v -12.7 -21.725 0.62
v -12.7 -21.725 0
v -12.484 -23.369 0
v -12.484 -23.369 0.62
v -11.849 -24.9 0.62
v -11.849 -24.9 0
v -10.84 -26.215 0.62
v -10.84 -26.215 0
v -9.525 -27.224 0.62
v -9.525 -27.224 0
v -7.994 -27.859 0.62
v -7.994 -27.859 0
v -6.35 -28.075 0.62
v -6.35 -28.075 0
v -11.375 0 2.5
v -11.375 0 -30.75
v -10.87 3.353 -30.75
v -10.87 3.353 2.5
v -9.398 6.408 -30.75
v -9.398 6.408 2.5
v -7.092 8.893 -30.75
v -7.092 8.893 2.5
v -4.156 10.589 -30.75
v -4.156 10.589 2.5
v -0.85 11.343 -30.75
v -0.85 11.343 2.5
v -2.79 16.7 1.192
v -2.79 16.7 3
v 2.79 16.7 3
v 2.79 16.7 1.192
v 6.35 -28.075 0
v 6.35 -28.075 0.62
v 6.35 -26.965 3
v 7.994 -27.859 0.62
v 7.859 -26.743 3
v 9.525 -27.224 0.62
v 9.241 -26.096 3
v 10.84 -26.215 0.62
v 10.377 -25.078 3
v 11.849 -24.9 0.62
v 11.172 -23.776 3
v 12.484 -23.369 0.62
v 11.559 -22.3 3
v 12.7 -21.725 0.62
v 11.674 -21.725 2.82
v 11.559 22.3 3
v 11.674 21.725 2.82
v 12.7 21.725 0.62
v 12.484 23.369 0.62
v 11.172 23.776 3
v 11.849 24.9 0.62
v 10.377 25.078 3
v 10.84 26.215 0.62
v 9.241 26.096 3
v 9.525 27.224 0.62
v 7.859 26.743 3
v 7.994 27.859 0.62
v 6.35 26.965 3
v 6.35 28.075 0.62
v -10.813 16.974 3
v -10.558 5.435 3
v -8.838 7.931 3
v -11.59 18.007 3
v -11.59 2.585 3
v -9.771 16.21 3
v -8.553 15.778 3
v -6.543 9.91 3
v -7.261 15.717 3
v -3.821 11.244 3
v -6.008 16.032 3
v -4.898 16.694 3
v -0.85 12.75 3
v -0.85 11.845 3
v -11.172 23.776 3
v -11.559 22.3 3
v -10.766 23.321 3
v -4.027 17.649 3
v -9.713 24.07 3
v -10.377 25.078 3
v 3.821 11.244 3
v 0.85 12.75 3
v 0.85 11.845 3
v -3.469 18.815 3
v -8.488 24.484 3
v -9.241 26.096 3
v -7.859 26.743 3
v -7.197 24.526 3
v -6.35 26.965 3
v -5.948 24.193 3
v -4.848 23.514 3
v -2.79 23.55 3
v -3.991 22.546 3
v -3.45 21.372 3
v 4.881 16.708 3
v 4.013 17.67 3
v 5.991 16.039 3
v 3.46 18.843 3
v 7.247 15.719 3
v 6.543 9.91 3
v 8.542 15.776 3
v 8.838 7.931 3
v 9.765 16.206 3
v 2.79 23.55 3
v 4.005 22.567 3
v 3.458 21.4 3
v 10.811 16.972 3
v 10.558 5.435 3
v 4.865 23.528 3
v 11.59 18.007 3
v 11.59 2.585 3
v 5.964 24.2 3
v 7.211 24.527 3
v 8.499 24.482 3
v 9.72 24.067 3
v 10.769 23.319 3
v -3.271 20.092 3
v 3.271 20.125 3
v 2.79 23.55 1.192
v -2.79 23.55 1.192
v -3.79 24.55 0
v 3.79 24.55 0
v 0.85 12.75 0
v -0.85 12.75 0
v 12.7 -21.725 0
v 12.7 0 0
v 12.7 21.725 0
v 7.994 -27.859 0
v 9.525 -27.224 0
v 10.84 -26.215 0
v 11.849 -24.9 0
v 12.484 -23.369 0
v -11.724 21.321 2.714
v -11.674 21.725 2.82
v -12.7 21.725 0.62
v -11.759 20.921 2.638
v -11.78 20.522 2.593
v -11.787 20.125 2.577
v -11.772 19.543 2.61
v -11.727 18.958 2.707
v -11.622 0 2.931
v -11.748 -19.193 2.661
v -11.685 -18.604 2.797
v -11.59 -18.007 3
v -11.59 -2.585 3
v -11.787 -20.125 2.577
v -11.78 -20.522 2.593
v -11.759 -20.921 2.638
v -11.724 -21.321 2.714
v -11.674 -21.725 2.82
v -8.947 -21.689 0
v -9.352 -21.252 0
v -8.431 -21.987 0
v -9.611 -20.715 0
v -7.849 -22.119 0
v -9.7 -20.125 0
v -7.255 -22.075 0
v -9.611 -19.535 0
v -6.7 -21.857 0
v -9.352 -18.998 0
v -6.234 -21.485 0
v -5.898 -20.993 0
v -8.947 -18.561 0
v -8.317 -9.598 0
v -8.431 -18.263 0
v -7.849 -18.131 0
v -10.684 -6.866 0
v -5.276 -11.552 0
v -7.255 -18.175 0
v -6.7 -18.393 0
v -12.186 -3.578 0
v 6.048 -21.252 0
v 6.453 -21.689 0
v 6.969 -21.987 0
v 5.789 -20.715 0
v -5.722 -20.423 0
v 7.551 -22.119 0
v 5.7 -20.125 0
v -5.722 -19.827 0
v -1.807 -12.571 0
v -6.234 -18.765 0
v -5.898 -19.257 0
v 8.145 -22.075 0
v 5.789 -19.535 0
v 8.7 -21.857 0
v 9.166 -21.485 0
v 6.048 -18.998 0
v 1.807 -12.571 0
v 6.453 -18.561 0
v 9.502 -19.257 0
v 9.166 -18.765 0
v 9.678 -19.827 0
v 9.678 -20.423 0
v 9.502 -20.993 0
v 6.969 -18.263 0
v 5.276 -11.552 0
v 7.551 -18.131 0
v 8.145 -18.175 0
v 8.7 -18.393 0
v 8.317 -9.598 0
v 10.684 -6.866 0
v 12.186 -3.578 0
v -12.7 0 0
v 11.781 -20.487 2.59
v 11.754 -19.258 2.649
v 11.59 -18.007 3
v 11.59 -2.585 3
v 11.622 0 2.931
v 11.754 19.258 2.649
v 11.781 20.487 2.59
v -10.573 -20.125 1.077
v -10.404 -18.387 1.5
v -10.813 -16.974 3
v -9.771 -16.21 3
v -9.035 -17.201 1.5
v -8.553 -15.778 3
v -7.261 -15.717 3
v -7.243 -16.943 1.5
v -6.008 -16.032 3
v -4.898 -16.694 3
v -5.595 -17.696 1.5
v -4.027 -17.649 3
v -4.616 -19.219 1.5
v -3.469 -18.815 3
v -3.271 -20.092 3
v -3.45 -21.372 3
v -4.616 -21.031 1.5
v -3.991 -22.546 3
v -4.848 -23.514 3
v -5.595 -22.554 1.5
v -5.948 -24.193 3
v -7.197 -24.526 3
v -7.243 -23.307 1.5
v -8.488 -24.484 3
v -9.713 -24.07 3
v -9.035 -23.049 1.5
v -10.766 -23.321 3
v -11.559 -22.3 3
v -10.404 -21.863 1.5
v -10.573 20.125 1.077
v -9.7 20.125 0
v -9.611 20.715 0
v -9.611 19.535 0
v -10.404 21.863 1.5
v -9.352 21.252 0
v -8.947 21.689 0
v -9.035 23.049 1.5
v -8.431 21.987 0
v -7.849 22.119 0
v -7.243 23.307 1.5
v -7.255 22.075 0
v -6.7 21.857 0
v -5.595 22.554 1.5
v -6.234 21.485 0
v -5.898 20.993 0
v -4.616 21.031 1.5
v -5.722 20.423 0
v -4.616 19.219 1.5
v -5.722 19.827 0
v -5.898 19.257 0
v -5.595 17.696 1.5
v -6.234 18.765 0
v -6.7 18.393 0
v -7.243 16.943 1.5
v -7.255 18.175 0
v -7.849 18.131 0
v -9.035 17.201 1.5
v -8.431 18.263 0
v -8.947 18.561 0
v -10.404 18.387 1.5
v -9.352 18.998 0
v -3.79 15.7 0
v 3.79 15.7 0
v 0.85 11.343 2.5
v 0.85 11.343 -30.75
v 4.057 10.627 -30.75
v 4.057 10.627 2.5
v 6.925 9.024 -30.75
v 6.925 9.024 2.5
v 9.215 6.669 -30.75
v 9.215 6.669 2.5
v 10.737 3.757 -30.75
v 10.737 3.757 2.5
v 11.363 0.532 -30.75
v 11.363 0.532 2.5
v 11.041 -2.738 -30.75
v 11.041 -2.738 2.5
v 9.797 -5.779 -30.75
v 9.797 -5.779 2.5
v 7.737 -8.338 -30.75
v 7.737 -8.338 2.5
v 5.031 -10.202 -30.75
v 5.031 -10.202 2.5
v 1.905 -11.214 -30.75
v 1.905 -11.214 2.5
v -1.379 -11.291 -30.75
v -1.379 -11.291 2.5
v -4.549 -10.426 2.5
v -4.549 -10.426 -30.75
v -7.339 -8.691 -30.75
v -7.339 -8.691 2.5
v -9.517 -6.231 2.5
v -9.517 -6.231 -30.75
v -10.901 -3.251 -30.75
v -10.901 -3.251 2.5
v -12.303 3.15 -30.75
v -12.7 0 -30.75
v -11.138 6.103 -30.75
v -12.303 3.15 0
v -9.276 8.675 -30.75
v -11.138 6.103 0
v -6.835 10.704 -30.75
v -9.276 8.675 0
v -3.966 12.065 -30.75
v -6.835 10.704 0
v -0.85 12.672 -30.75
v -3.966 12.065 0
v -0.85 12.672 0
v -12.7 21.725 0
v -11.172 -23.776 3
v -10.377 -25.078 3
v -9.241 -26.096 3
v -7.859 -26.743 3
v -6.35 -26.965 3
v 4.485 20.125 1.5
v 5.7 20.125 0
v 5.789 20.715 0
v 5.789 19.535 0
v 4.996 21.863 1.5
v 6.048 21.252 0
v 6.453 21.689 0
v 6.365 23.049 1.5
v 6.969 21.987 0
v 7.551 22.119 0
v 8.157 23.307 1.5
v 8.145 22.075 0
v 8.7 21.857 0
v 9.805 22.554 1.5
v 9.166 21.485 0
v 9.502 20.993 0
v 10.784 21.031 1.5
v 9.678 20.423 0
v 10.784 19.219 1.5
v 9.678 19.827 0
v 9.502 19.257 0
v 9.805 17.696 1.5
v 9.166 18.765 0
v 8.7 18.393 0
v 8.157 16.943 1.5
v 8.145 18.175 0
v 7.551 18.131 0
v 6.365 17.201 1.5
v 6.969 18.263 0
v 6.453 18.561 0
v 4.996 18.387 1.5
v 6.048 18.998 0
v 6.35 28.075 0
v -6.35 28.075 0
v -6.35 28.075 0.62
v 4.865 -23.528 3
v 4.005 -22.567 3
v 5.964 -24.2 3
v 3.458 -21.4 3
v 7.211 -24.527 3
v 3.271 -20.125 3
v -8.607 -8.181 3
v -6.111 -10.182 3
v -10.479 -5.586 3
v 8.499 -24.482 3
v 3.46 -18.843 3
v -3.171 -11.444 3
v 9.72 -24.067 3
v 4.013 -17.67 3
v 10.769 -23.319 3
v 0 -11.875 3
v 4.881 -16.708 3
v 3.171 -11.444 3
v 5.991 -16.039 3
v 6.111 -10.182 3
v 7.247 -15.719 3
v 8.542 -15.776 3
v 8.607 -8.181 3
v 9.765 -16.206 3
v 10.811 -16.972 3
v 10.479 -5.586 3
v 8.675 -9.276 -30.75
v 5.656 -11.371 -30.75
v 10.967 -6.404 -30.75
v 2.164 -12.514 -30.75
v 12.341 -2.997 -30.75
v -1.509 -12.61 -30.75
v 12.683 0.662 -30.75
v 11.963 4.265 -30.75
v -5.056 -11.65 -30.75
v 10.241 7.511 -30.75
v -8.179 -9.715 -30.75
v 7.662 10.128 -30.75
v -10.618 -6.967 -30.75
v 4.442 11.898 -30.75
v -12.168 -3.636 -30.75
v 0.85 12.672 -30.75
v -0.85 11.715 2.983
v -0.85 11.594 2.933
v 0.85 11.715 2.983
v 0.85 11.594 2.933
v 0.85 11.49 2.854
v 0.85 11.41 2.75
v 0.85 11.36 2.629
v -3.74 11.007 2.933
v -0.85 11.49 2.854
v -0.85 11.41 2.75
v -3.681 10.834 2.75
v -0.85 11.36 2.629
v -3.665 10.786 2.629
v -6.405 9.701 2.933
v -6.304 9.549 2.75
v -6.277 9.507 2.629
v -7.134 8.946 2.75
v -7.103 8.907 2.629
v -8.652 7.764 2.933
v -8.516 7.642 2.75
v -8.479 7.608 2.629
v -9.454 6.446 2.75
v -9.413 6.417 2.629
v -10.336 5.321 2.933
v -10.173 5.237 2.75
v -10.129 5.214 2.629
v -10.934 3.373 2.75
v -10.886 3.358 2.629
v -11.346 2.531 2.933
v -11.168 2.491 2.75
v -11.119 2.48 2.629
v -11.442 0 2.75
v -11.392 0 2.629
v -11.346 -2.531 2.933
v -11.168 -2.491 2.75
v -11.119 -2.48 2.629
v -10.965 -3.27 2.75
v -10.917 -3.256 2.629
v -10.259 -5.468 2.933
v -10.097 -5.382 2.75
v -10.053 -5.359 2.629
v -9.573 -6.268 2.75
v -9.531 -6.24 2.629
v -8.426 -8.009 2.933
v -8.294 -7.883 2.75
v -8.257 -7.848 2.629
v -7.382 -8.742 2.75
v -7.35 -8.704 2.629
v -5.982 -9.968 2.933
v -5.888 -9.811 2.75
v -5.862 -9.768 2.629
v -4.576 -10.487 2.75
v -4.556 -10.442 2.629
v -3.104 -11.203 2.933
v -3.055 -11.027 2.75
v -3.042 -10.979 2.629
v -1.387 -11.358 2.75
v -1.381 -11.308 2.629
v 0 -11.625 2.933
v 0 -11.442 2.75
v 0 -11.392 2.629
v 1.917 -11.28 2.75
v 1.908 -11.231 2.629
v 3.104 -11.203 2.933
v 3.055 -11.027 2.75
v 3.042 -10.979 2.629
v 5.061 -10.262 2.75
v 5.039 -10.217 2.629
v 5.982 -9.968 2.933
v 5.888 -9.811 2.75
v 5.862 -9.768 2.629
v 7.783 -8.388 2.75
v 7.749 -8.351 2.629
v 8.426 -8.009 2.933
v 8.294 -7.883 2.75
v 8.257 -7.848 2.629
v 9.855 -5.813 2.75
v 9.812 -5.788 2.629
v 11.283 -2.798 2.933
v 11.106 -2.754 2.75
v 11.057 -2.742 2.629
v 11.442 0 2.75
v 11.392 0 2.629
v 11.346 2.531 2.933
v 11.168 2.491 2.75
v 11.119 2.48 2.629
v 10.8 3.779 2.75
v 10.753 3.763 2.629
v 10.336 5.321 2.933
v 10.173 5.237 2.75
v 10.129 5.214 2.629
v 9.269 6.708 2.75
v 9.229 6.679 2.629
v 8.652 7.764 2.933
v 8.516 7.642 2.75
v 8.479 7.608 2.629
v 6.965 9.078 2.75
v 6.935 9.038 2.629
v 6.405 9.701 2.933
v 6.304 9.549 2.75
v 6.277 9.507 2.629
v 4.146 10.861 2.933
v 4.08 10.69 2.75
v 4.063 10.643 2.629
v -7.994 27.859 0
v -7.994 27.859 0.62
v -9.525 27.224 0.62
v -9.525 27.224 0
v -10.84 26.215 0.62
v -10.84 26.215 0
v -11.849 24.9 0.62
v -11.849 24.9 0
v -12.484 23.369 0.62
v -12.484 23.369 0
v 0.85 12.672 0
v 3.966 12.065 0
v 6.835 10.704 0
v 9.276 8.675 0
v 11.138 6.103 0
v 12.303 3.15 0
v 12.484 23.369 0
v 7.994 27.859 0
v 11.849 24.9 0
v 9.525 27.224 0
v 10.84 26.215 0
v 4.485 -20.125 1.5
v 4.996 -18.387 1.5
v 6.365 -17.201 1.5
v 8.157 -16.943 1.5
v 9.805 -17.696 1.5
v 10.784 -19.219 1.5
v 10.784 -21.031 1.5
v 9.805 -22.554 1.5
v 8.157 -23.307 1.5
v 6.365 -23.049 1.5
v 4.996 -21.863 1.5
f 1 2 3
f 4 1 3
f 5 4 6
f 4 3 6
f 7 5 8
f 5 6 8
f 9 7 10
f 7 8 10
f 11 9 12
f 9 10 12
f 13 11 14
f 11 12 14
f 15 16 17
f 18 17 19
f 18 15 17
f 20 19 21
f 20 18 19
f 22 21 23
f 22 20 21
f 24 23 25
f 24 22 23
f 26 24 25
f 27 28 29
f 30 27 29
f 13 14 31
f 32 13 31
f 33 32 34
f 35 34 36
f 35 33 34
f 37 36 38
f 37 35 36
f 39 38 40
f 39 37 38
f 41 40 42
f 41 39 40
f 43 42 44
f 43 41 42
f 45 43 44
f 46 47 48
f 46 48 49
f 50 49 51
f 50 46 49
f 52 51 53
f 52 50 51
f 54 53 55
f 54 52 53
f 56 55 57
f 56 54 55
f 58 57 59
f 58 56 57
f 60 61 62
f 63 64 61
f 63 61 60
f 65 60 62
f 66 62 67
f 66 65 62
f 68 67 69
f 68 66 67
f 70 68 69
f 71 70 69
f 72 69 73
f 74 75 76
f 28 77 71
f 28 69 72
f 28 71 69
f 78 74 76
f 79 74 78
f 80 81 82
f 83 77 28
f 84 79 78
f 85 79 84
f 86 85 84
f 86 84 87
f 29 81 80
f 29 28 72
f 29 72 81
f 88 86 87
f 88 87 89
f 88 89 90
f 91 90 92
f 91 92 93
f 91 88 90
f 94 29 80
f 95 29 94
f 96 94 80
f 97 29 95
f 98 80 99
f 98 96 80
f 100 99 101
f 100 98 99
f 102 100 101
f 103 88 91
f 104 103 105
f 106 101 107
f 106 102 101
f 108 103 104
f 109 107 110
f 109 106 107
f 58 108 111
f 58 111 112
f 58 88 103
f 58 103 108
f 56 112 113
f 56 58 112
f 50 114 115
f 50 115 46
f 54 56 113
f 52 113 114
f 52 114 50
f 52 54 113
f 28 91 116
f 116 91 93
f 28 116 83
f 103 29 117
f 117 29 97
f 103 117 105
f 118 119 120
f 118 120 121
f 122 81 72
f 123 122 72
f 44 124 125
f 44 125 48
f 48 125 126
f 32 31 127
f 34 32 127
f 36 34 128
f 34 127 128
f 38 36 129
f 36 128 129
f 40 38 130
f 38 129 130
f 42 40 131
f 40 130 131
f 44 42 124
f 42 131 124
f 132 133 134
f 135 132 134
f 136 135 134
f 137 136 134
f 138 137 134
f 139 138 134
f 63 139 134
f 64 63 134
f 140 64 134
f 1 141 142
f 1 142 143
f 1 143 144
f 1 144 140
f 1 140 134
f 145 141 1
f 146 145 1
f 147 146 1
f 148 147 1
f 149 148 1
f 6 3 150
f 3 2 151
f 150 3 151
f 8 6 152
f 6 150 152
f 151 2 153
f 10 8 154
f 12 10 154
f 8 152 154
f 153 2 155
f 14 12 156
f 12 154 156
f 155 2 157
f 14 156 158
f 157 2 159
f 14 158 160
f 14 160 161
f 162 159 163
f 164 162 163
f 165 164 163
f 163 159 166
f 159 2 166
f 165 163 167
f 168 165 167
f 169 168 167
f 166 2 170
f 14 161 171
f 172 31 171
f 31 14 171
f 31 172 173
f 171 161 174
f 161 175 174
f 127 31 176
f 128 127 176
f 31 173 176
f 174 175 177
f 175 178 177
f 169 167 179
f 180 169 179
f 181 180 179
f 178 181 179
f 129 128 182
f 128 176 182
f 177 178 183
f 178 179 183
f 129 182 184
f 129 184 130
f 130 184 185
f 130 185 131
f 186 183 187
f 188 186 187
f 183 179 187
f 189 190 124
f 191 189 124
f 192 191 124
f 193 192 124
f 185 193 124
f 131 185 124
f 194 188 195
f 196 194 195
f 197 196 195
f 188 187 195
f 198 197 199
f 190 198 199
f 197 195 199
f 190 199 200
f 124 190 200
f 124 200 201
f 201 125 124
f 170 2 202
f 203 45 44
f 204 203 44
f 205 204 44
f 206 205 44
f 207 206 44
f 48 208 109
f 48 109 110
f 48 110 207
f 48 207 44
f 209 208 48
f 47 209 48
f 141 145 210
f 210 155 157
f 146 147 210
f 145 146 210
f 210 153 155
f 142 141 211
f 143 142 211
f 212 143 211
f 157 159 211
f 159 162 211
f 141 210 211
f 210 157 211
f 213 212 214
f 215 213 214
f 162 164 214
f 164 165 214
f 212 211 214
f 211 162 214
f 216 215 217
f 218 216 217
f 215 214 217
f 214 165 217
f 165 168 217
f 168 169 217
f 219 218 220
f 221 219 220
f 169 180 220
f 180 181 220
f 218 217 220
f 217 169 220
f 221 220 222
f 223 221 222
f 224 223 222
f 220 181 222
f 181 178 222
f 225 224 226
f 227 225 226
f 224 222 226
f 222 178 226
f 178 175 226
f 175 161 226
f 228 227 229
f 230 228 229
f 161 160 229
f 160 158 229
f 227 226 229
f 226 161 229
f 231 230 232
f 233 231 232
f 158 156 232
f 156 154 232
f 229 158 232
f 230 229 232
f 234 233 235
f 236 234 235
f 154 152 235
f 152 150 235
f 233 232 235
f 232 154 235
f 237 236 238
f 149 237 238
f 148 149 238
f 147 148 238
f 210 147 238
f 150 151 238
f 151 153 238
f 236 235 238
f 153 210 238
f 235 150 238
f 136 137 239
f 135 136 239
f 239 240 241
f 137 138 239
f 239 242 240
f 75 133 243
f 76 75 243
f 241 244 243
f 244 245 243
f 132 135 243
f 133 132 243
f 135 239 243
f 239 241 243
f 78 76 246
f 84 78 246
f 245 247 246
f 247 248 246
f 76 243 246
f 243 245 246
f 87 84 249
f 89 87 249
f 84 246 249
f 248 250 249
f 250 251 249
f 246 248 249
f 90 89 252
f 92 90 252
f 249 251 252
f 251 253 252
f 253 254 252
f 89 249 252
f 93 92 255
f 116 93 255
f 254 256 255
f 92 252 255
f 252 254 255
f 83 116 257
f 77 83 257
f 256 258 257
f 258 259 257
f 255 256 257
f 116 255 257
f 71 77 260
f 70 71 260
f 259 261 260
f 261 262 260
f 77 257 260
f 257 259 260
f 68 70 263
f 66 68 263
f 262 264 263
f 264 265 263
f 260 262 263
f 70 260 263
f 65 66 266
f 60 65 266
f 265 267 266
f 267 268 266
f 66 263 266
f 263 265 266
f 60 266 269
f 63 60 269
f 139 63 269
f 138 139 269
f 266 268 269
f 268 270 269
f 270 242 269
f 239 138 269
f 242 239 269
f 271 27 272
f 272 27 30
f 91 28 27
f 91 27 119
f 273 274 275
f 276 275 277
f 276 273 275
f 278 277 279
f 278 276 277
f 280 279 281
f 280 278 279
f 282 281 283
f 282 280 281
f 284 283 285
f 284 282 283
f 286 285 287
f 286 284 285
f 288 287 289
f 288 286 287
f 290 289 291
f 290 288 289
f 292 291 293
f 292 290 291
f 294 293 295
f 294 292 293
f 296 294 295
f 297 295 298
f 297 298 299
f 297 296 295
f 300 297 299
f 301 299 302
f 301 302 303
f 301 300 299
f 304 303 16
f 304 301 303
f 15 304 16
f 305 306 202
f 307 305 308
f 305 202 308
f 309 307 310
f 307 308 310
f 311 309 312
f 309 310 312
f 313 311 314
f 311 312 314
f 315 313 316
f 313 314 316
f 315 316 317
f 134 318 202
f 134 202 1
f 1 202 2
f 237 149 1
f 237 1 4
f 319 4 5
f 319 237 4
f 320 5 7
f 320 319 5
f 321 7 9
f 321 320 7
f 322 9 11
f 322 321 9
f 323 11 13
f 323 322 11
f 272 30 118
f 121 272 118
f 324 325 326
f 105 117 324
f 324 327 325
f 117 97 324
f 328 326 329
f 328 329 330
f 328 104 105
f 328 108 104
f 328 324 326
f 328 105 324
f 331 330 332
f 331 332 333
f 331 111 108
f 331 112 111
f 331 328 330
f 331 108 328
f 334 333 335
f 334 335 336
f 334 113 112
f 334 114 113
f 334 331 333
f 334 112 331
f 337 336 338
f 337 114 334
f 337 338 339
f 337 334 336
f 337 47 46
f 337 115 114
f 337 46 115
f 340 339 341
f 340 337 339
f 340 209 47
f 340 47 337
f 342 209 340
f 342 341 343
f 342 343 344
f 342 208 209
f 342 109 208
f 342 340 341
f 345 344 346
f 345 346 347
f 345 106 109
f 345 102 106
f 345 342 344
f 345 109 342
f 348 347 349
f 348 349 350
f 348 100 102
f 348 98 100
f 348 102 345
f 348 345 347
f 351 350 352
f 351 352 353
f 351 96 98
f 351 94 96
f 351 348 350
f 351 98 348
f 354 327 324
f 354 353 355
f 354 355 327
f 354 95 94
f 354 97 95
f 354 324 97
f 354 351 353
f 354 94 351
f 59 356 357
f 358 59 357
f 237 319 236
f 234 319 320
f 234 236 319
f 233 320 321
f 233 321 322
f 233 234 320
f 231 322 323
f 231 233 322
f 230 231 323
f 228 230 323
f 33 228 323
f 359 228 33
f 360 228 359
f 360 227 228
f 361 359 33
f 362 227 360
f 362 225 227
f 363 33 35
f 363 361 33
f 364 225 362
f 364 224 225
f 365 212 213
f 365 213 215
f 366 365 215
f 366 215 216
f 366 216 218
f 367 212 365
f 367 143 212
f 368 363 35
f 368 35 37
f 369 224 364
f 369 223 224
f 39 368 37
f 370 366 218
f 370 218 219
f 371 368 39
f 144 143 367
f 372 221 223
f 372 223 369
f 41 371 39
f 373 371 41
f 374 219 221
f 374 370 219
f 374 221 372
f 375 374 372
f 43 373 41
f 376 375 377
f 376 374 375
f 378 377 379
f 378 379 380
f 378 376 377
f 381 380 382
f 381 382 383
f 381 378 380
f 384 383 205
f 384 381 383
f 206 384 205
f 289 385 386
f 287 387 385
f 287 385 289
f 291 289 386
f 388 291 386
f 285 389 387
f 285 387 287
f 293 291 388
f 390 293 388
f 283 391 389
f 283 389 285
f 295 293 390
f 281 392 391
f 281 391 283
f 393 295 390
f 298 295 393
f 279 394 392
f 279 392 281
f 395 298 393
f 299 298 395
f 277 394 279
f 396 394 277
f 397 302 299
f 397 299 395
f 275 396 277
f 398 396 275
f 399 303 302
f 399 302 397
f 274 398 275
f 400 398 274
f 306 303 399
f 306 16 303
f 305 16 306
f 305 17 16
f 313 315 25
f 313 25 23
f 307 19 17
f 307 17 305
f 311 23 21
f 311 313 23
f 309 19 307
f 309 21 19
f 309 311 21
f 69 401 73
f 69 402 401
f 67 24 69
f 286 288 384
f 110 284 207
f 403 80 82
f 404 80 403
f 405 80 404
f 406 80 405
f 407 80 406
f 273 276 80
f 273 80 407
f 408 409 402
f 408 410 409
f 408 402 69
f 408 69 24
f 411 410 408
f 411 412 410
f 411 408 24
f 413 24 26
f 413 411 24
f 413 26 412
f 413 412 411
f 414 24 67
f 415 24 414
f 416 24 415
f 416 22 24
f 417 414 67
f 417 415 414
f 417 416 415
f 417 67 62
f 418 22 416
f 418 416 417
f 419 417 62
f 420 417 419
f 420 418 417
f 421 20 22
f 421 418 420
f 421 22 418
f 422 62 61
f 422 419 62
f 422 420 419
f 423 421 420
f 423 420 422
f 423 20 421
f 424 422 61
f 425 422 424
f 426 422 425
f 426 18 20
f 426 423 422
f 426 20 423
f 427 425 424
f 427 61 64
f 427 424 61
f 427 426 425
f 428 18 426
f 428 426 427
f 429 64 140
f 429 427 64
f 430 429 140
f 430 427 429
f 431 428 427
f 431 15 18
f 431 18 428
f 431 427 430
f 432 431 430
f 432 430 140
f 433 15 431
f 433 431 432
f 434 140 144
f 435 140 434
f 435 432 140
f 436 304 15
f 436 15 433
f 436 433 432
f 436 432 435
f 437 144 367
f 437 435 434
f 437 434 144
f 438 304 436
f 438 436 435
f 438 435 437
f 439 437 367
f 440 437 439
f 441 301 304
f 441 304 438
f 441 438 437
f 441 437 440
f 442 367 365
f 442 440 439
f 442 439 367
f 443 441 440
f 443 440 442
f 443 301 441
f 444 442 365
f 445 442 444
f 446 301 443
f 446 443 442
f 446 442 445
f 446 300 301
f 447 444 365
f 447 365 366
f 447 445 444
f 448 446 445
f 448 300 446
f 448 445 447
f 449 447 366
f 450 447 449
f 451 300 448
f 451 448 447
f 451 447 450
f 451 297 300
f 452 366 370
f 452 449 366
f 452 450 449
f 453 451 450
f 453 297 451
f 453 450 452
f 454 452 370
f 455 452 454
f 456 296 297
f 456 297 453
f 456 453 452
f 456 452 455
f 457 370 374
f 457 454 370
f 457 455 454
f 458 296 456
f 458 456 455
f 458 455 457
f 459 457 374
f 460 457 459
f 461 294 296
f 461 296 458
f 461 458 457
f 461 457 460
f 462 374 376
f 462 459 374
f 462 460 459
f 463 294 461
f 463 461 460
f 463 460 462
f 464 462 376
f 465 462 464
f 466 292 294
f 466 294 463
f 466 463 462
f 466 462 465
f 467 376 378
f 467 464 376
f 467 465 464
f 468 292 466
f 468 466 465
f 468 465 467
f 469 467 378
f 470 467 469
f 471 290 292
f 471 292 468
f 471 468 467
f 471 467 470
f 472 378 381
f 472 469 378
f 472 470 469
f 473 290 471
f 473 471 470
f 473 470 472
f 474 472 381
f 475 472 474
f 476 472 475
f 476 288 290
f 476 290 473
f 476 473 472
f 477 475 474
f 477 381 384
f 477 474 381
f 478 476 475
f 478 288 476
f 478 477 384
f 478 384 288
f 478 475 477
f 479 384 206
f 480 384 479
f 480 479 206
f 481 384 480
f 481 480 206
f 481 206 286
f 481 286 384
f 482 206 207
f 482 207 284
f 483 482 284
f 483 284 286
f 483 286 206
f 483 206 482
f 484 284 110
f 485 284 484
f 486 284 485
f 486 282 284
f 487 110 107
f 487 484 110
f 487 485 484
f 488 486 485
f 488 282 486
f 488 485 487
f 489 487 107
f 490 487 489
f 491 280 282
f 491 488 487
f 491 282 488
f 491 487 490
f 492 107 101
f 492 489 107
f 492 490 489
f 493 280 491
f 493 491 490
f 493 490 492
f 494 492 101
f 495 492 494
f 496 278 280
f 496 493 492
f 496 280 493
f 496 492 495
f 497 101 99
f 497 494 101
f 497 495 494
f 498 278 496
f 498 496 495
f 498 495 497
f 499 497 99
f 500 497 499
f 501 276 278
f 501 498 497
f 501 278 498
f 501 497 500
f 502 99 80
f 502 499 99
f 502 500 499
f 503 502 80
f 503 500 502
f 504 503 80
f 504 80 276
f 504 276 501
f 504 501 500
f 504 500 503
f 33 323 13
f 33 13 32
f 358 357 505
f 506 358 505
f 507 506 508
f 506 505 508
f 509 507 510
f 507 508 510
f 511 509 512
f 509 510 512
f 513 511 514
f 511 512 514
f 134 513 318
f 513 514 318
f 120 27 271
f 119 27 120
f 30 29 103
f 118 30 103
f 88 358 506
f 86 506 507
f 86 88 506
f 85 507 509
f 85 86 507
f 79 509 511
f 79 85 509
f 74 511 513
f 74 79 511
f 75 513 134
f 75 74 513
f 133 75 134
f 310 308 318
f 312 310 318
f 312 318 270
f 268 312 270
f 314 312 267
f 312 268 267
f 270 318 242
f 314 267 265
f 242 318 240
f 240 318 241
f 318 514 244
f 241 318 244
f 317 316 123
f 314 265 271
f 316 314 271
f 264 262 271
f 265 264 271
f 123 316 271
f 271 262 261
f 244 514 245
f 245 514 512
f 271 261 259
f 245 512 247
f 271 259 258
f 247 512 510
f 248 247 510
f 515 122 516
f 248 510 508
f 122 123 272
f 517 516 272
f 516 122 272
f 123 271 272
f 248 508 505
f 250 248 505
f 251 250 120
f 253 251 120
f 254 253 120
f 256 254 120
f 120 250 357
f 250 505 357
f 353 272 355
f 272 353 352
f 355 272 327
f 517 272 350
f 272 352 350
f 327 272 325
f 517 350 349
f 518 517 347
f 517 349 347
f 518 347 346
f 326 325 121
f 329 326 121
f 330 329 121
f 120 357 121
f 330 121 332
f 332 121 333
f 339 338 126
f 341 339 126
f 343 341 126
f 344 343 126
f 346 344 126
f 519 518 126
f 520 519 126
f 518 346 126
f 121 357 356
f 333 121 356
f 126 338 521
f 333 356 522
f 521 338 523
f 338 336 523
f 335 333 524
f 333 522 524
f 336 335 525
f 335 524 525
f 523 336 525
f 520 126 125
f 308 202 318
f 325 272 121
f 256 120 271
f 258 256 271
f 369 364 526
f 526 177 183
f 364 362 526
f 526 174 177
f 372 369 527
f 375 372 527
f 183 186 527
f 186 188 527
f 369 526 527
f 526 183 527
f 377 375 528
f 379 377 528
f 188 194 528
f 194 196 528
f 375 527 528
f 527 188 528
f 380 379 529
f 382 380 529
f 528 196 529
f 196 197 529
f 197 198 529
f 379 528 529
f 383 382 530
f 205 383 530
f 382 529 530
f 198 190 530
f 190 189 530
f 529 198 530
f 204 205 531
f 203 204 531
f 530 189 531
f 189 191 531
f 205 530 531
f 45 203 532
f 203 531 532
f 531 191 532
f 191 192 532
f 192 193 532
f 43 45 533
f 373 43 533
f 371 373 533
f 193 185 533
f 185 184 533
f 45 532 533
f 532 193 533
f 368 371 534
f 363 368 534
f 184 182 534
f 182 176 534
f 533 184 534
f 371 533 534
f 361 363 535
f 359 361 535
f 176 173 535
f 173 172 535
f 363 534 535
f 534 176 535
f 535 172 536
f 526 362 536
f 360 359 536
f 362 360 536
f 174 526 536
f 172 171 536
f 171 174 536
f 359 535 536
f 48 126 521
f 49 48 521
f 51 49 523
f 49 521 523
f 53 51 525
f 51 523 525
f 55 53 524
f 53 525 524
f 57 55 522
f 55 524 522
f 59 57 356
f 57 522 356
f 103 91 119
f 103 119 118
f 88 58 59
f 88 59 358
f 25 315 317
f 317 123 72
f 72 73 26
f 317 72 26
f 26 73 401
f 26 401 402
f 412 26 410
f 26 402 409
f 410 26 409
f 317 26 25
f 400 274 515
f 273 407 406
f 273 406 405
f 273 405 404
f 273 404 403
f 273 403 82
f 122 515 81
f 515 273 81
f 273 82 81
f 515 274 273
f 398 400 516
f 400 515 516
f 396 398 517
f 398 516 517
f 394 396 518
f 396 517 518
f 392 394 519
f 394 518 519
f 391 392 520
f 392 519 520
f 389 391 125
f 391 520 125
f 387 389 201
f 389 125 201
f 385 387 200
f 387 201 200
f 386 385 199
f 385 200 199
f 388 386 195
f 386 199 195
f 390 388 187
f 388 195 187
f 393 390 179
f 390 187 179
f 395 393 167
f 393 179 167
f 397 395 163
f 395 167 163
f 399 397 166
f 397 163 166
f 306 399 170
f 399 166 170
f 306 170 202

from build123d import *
from OCP.BRepFilletAPI import BRepFilletAPI_MakeChamfer

# Parameters (mm, degrees)
BOSS_EXTRUDE1_DEPTH = 3
SKETCH2_R           = 2
CUT_EXTRUDE1_DEPTH  = 31.959580504
CHAMFER1_SIZE       = 2.38
CHAMFER1_SIZE2      = 1.109812226
SKETCH3_R           = 12.7
SKETCH3_R_2         = 11.375
BOSS_EXTRUDE2_DEPTH = 30.75
SKETCH5_W           = 5.58
SKETCH5_H           = 6.85
CUT_EXTRUDE3_DEPTH  = 10
CHAMFER3_SIZE       = 1
CHAMFER3_SIZE2      = 1.191753593
CUT_EXTRUDE4_START  = -5
SKETCH6_R           = 11.375
CUT_EXTRUDE4_DEPTH  = 5
CHAMFER4_SIZE       = 2.4293521
CHAMFER4_SIZE_2     = 3
FILLET1_R           = 0.5
CUT_EXTRUDE6_START  = -35
CUT_EXTRUDE6_DEPTH  = 35


with BuildPart() as part:
    # Sketch1 → Boss-Extrude1 (new body)
    with BuildSketch(Plane.XY):
        with BuildLine():
            Line((6.35, 28.075), (-6.35, 28.075))
            ThreePointArc((-6.35, 28.075), (-10.840128061, 26.215128061), (-12.7, 21.725))
            Line((-12.7, 21.725), (-12.7, -21.725))
            ThreePointArc((-12.7, -21.725), (-10.840128061, -26.215128061), (-6.35, -28.075))
            Line((-6.35, -28.075), (6.35, -28.075))
            ThreePointArc((6.35, -28.075), (10.840128061, -26.215128061), (12.7, -21.725))
            Line((12.7, -21.725), (12.7, 21.725))
            ThreePointArc((12.7, 21.725), (10.840128061, 26.215128061), (6.35, 28.075))
        make_face()
    extrude(amount=BOSS_EXTRUDE1_DEPTH)

    # Sketch2 → Cut-Extrude1 (cut, through all)
    with BuildSketch(Plane(origin=(0, 0, 0), x_dir=(-1, 0, 0), z_dir=(0, 0, -1))):
        with Locations((-7.7, -20.125)):
            Circle(SKETCH2_R)
        with Locations((-7.7, 20.125)):
            Circle(SKETCH2_R)
        with Locations((7.7, 20.125)):
            Circle(SKETCH2_R)
        with Locations((7.7, -20.125)):
            Circle(SKETCH2_R)
    extrude(amount=-CUT_EXTRUDE1_DEPTH, mode=Mode.SUBTRACT)

    # Chamfer1: one chamfer whose edges measure the first distance from different faces: ONE call of the kernel's chamfer builder (chamfer() names one face for all edges)
    chamfer1_edges_1 = [part.edges().sort_by_distance(p)[0] for p in [
        (-10.840128061, 26.215128061, 3),
    ]]
    chamfer1_side_1 = [part.faces().sort_by_distance(p)[0] for p in [
        (-10.840128061, 26.215128061, 1.5),
    ]]
    chamfer1_edges_2 = [part.edges().sort_by_distance(p)[0] for p in [
        (-12.7, 0, 3),
    ]]
    chamfer1_side_2 = [part.faces().sort_by_distance(p)[0] for p in [
        (-12.7, 0, 1.5),
    ]]
    chamfer1_edges_3 = [part.edges().sort_by_distance(p)[0] for p in [
        (-10.840128061, -26.215128061, 3),
    ]]
    chamfer1_side_3 = [part.faces().sort_by_distance(p)[0] for p in [
        (-10.840128061, -26.215128061, 1.5),
    ]]
    chamfer1_edges_4 = [part.edges().sort_by_distance(p)[0] for p in [
        (0, -28.075, 3),
    ]]
    chamfer1_side_4 = [part.faces().sort_by_distance(p)[0] for p in [
        (0, -28.075, 1.5),
    ]]
    chamfer1_edges_5 = [part.edges().sort_by_distance(p)[0] for p in [
        (10.840128061, -26.215128061, 3),
    ]]
    chamfer1_side_5 = [part.faces().sort_by_distance(p)[0] for p in [
        (10.840128061, -26.215128061, 1.5),
    ]]
    chamfer1_edges_6 = [part.edges().sort_by_distance(p)[0] for p in [
        (12.7, 0, 3),
    ]]
    chamfer1_side_6 = [part.faces().sort_by_distance(p)[0] for p in [
        (12.7, 0, 1.5),
    ]]
    chamfer1_edges_7 = [part.edges().sort_by_distance(p)[0] for p in [
        (10.840128061, 26.215128061, 3),
    ]]
    chamfer1_side_7 = [part.faces().sort_by_distance(p)[0] for p in [
        (10.840128061, 26.215128061, 1.5),
    ]]
    chamfer1_edges_8 = [part.edges().sort_by_distance(p)[0] for p in [
        (0, 28.075, 3),
    ]]
    chamfer1_side_8 = [part.faces().sort_by_distance(p)[0] for p in [
        (0, 28.075, 1.5),
    ]]
    chamfer1 = BRepFilletAPI_MakeChamfer(part.part.solid().wrapped)
    for e in chamfer1_edges_1:
        chamfer1.Add(CHAMFER1_SIZE, CHAMFER1_SIZE2, e.wrapped, chamfer1_side_1[0].wrapped)  # the first distance lies on this face
    for e in chamfer1_edges_2:
        chamfer1.Add(CHAMFER1_SIZE, CHAMFER1_SIZE2, e.wrapped, chamfer1_side_2[0].wrapped)  # the first distance lies on this face
    for e in chamfer1_edges_3:
        chamfer1.Add(CHAMFER1_SIZE, CHAMFER1_SIZE2, e.wrapped, chamfer1_side_3[0].wrapped)  # the first distance lies on this face
    for e in chamfer1_edges_4:
        chamfer1.Add(CHAMFER1_SIZE, CHAMFER1_SIZE2, e.wrapped, chamfer1_side_4[0].wrapped)  # the first distance lies on this face
    for e in chamfer1_edges_5:
        chamfer1.Add(CHAMFER1_SIZE, CHAMFER1_SIZE2, e.wrapped, chamfer1_side_5[0].wrapped)  # the first distance lies on this face
    for e in chamfer1_edges_6:
        chamfer1.Add(CHAMFER1_SIZE, CHAMFER1_SIZE2, e.wrapped, chamfer1_side_6[0].wrapped)  # the first distance lies on this face
    for e in chamfer1_edges_7:
        chamfer1.Add(CHAMFER1_SIZE, CHAMFER1_SIZE2, e.wrapped, chamfer1_side_7[0].wrapped)  # the first distance lies on this face
    for e in chamfer1_edges_8:
        chamfer1.Add(CHAMFER1_SIZE, CHAMFER1_SIZE2, e.wrapped, chamfer1_side_8[0].wrapped)  # the first distance lies on this face
    add(Compound.cast(chamfer1.Shape()), mode=Mode.REPLACE)

    # Sketch3 → Boss-Extrude2 (add)
    with BuildSketch(Plane(origin=(0, 0, 0), x_dir=(-1, 0, 0), z_dir=(0, 0, -1))):
        Circle(SKETCH3_R)
        Circle(SKETCH3_R_2, mode=Mode.SUBTRACT)
    extrude(amount=BOSS_EXTRUDE2_DEPTH)

    # Sketch5 → Cut-Extrude3 (cut)
    with BuildSketch(Plane.XY.offset(3)):
        with Locations((-0.000187774, 20.125)):
            Rectangle(SKETCH5_W, SKETCH5_H)
    extrude(amount=-CUT_EXTRUDE3_DEPTH, mode=Mode.SUBTRACT)

    # Chamfer3
    chamfer3_edges = [part.edges().sort_by_distance(p)[0] for p in [
        (2.789812226, 20.125, 0),
        (-0.000187774, 16.7, 0),
        (-2.790187774, 20.125, 0),
        (-0.000187774, 23.55, 0),
    ]]
    chamfer3_side = [part.faces().sort_by_distance(p)[0] for p in [
        (10.572418738, 25.947418738, 0),
    ]]
    chamfer(chamfer3_edges, length=CHAMFER3_SIZE, length2=CHAMFER3_SIZE2, reference=chamfer3_side[0])

    # Sketch6 → Cut-Extrude4 (cut)
    with BuildSketch(Plane(origin=(0, 0, 0), x_dir=(-1, 0, 0), z_dir=(0, 0, -1)).offset(CUT_EXTRUDE4_START)):
        Circle(SKETCH6_R)
    extrude(amount=CUT_EXTRUDE4_DEPTH, mode=Mode.SUBTRACT)

    # Chamfer4
    # the kernel refuses this chamfer: 3, 2.4293521 mm, written as the material it takes off along each edge
    with BuildSketch(Plane(origin=(7.7, -20.125, 3), x_dir=(-1, 0, 0), z_dir=(0, -1, 0))) as chamfer4_piece_1:
        Polygon((2 + CHAMFER4_SIZE, 0), (2, CHAMFER4_SIZE_2), (2, 0), align=None)
    revolve(axis=Axis((7.7, -20.125, 3), (0, 0, -1)), mode=Mode.SUBTRACT)
    with BuildSketch(Plane(origin=(-7.7, 20.125, 3), x_dir=(-1, 0, 0), z_dir=(0, -1, 0))) as chamfer4_piece_2:
        Polygon((2 + CHAMFER4_SIZE, 0), (2, CHAMFER4_SIZE_2), (2, 0), align=None)
    revolve(axis=Axis((-7.7, 20.125, 3), (0, 0, -1)), mode=Mode.SUBTRACT)
    with BuildSketch(Plane(origin=(-7.7, -20.125, 3), x_dir=(-1, 0, 0), z_dir=(0, -1, 0))) as chamfer4_piece_3:
        Polygon((2 + CHAMFER4_SIZE, 0), (2, CHAMFER4_SIZE_2), (2, 0), align=None)
    revolve(axis=Axis((-7.7, -20.125, 3), (0, 0, -1)), mode=Mode.SUBTRACT)
    with BuildSketch(Plane(origin=(7.7, 20.125, 3), x_dir=(-1, 0, 0), z_dir=(0, -1, 0))) as chamfer4_piece_4:
        Polygon((2, CHAMFER4_SIZE_2), (2 + CHAMFER4_SIZE, 0), (2, 0), align=None)
    revolve(axis=Axis((7.7, 20.125, 3), (0, 0, -1)), mode=Mode.SUBTRACT)

    # Fillet1
    # the kernel refuses this fillet: 0.5 mm, written as the material it takes off along each edge
    with BuildSketch(Plane(origin=(0, 0, 3), x_dir=(-1, 0, 0), z_dir=(0, 1, 0))) as fillet1_piece_1:
        with BuildLine():
            CenterArc((11.375 + FILLET1_R, -FILLET1_R), FILLET1_R, 90, 90)
            Line((11.375, -FILLET1_R), (11.375, 0))
            Line((11.375, 0), (11.375 + FILLET1_R, 0))
        make_face()
    revolve(axis=Axis((0, 0, 3), (0, 0, 1)), mode=Mode.SUBTRACT)

    # Sketch7 → Cut-Extrude6 (cut)
    with BuildSketch(Plane(origin=(0, 0, -30.75), x_dir=(-1, 0, 0), z_dir=(0, 0, -1)).offset(CUT_EXTRUDE6_START)):
        with BuildLine():
            Line((-0.85, 11.343197301), (-0.85, 12.75))
            Line((-0.85, 12.75), (0.85, 12.75))
            Line((0.85, 12.75), (0.85, 11.343197301))
            ThreePointArc((0.85, 11.343197301), (0, 11.375), (-0.85, 11.343197301))
        make_face()
    extrude(amount=CUT_EXTRUDE6_DEPTH, mode=Mode.SUBTRACT)


solid = part.part
